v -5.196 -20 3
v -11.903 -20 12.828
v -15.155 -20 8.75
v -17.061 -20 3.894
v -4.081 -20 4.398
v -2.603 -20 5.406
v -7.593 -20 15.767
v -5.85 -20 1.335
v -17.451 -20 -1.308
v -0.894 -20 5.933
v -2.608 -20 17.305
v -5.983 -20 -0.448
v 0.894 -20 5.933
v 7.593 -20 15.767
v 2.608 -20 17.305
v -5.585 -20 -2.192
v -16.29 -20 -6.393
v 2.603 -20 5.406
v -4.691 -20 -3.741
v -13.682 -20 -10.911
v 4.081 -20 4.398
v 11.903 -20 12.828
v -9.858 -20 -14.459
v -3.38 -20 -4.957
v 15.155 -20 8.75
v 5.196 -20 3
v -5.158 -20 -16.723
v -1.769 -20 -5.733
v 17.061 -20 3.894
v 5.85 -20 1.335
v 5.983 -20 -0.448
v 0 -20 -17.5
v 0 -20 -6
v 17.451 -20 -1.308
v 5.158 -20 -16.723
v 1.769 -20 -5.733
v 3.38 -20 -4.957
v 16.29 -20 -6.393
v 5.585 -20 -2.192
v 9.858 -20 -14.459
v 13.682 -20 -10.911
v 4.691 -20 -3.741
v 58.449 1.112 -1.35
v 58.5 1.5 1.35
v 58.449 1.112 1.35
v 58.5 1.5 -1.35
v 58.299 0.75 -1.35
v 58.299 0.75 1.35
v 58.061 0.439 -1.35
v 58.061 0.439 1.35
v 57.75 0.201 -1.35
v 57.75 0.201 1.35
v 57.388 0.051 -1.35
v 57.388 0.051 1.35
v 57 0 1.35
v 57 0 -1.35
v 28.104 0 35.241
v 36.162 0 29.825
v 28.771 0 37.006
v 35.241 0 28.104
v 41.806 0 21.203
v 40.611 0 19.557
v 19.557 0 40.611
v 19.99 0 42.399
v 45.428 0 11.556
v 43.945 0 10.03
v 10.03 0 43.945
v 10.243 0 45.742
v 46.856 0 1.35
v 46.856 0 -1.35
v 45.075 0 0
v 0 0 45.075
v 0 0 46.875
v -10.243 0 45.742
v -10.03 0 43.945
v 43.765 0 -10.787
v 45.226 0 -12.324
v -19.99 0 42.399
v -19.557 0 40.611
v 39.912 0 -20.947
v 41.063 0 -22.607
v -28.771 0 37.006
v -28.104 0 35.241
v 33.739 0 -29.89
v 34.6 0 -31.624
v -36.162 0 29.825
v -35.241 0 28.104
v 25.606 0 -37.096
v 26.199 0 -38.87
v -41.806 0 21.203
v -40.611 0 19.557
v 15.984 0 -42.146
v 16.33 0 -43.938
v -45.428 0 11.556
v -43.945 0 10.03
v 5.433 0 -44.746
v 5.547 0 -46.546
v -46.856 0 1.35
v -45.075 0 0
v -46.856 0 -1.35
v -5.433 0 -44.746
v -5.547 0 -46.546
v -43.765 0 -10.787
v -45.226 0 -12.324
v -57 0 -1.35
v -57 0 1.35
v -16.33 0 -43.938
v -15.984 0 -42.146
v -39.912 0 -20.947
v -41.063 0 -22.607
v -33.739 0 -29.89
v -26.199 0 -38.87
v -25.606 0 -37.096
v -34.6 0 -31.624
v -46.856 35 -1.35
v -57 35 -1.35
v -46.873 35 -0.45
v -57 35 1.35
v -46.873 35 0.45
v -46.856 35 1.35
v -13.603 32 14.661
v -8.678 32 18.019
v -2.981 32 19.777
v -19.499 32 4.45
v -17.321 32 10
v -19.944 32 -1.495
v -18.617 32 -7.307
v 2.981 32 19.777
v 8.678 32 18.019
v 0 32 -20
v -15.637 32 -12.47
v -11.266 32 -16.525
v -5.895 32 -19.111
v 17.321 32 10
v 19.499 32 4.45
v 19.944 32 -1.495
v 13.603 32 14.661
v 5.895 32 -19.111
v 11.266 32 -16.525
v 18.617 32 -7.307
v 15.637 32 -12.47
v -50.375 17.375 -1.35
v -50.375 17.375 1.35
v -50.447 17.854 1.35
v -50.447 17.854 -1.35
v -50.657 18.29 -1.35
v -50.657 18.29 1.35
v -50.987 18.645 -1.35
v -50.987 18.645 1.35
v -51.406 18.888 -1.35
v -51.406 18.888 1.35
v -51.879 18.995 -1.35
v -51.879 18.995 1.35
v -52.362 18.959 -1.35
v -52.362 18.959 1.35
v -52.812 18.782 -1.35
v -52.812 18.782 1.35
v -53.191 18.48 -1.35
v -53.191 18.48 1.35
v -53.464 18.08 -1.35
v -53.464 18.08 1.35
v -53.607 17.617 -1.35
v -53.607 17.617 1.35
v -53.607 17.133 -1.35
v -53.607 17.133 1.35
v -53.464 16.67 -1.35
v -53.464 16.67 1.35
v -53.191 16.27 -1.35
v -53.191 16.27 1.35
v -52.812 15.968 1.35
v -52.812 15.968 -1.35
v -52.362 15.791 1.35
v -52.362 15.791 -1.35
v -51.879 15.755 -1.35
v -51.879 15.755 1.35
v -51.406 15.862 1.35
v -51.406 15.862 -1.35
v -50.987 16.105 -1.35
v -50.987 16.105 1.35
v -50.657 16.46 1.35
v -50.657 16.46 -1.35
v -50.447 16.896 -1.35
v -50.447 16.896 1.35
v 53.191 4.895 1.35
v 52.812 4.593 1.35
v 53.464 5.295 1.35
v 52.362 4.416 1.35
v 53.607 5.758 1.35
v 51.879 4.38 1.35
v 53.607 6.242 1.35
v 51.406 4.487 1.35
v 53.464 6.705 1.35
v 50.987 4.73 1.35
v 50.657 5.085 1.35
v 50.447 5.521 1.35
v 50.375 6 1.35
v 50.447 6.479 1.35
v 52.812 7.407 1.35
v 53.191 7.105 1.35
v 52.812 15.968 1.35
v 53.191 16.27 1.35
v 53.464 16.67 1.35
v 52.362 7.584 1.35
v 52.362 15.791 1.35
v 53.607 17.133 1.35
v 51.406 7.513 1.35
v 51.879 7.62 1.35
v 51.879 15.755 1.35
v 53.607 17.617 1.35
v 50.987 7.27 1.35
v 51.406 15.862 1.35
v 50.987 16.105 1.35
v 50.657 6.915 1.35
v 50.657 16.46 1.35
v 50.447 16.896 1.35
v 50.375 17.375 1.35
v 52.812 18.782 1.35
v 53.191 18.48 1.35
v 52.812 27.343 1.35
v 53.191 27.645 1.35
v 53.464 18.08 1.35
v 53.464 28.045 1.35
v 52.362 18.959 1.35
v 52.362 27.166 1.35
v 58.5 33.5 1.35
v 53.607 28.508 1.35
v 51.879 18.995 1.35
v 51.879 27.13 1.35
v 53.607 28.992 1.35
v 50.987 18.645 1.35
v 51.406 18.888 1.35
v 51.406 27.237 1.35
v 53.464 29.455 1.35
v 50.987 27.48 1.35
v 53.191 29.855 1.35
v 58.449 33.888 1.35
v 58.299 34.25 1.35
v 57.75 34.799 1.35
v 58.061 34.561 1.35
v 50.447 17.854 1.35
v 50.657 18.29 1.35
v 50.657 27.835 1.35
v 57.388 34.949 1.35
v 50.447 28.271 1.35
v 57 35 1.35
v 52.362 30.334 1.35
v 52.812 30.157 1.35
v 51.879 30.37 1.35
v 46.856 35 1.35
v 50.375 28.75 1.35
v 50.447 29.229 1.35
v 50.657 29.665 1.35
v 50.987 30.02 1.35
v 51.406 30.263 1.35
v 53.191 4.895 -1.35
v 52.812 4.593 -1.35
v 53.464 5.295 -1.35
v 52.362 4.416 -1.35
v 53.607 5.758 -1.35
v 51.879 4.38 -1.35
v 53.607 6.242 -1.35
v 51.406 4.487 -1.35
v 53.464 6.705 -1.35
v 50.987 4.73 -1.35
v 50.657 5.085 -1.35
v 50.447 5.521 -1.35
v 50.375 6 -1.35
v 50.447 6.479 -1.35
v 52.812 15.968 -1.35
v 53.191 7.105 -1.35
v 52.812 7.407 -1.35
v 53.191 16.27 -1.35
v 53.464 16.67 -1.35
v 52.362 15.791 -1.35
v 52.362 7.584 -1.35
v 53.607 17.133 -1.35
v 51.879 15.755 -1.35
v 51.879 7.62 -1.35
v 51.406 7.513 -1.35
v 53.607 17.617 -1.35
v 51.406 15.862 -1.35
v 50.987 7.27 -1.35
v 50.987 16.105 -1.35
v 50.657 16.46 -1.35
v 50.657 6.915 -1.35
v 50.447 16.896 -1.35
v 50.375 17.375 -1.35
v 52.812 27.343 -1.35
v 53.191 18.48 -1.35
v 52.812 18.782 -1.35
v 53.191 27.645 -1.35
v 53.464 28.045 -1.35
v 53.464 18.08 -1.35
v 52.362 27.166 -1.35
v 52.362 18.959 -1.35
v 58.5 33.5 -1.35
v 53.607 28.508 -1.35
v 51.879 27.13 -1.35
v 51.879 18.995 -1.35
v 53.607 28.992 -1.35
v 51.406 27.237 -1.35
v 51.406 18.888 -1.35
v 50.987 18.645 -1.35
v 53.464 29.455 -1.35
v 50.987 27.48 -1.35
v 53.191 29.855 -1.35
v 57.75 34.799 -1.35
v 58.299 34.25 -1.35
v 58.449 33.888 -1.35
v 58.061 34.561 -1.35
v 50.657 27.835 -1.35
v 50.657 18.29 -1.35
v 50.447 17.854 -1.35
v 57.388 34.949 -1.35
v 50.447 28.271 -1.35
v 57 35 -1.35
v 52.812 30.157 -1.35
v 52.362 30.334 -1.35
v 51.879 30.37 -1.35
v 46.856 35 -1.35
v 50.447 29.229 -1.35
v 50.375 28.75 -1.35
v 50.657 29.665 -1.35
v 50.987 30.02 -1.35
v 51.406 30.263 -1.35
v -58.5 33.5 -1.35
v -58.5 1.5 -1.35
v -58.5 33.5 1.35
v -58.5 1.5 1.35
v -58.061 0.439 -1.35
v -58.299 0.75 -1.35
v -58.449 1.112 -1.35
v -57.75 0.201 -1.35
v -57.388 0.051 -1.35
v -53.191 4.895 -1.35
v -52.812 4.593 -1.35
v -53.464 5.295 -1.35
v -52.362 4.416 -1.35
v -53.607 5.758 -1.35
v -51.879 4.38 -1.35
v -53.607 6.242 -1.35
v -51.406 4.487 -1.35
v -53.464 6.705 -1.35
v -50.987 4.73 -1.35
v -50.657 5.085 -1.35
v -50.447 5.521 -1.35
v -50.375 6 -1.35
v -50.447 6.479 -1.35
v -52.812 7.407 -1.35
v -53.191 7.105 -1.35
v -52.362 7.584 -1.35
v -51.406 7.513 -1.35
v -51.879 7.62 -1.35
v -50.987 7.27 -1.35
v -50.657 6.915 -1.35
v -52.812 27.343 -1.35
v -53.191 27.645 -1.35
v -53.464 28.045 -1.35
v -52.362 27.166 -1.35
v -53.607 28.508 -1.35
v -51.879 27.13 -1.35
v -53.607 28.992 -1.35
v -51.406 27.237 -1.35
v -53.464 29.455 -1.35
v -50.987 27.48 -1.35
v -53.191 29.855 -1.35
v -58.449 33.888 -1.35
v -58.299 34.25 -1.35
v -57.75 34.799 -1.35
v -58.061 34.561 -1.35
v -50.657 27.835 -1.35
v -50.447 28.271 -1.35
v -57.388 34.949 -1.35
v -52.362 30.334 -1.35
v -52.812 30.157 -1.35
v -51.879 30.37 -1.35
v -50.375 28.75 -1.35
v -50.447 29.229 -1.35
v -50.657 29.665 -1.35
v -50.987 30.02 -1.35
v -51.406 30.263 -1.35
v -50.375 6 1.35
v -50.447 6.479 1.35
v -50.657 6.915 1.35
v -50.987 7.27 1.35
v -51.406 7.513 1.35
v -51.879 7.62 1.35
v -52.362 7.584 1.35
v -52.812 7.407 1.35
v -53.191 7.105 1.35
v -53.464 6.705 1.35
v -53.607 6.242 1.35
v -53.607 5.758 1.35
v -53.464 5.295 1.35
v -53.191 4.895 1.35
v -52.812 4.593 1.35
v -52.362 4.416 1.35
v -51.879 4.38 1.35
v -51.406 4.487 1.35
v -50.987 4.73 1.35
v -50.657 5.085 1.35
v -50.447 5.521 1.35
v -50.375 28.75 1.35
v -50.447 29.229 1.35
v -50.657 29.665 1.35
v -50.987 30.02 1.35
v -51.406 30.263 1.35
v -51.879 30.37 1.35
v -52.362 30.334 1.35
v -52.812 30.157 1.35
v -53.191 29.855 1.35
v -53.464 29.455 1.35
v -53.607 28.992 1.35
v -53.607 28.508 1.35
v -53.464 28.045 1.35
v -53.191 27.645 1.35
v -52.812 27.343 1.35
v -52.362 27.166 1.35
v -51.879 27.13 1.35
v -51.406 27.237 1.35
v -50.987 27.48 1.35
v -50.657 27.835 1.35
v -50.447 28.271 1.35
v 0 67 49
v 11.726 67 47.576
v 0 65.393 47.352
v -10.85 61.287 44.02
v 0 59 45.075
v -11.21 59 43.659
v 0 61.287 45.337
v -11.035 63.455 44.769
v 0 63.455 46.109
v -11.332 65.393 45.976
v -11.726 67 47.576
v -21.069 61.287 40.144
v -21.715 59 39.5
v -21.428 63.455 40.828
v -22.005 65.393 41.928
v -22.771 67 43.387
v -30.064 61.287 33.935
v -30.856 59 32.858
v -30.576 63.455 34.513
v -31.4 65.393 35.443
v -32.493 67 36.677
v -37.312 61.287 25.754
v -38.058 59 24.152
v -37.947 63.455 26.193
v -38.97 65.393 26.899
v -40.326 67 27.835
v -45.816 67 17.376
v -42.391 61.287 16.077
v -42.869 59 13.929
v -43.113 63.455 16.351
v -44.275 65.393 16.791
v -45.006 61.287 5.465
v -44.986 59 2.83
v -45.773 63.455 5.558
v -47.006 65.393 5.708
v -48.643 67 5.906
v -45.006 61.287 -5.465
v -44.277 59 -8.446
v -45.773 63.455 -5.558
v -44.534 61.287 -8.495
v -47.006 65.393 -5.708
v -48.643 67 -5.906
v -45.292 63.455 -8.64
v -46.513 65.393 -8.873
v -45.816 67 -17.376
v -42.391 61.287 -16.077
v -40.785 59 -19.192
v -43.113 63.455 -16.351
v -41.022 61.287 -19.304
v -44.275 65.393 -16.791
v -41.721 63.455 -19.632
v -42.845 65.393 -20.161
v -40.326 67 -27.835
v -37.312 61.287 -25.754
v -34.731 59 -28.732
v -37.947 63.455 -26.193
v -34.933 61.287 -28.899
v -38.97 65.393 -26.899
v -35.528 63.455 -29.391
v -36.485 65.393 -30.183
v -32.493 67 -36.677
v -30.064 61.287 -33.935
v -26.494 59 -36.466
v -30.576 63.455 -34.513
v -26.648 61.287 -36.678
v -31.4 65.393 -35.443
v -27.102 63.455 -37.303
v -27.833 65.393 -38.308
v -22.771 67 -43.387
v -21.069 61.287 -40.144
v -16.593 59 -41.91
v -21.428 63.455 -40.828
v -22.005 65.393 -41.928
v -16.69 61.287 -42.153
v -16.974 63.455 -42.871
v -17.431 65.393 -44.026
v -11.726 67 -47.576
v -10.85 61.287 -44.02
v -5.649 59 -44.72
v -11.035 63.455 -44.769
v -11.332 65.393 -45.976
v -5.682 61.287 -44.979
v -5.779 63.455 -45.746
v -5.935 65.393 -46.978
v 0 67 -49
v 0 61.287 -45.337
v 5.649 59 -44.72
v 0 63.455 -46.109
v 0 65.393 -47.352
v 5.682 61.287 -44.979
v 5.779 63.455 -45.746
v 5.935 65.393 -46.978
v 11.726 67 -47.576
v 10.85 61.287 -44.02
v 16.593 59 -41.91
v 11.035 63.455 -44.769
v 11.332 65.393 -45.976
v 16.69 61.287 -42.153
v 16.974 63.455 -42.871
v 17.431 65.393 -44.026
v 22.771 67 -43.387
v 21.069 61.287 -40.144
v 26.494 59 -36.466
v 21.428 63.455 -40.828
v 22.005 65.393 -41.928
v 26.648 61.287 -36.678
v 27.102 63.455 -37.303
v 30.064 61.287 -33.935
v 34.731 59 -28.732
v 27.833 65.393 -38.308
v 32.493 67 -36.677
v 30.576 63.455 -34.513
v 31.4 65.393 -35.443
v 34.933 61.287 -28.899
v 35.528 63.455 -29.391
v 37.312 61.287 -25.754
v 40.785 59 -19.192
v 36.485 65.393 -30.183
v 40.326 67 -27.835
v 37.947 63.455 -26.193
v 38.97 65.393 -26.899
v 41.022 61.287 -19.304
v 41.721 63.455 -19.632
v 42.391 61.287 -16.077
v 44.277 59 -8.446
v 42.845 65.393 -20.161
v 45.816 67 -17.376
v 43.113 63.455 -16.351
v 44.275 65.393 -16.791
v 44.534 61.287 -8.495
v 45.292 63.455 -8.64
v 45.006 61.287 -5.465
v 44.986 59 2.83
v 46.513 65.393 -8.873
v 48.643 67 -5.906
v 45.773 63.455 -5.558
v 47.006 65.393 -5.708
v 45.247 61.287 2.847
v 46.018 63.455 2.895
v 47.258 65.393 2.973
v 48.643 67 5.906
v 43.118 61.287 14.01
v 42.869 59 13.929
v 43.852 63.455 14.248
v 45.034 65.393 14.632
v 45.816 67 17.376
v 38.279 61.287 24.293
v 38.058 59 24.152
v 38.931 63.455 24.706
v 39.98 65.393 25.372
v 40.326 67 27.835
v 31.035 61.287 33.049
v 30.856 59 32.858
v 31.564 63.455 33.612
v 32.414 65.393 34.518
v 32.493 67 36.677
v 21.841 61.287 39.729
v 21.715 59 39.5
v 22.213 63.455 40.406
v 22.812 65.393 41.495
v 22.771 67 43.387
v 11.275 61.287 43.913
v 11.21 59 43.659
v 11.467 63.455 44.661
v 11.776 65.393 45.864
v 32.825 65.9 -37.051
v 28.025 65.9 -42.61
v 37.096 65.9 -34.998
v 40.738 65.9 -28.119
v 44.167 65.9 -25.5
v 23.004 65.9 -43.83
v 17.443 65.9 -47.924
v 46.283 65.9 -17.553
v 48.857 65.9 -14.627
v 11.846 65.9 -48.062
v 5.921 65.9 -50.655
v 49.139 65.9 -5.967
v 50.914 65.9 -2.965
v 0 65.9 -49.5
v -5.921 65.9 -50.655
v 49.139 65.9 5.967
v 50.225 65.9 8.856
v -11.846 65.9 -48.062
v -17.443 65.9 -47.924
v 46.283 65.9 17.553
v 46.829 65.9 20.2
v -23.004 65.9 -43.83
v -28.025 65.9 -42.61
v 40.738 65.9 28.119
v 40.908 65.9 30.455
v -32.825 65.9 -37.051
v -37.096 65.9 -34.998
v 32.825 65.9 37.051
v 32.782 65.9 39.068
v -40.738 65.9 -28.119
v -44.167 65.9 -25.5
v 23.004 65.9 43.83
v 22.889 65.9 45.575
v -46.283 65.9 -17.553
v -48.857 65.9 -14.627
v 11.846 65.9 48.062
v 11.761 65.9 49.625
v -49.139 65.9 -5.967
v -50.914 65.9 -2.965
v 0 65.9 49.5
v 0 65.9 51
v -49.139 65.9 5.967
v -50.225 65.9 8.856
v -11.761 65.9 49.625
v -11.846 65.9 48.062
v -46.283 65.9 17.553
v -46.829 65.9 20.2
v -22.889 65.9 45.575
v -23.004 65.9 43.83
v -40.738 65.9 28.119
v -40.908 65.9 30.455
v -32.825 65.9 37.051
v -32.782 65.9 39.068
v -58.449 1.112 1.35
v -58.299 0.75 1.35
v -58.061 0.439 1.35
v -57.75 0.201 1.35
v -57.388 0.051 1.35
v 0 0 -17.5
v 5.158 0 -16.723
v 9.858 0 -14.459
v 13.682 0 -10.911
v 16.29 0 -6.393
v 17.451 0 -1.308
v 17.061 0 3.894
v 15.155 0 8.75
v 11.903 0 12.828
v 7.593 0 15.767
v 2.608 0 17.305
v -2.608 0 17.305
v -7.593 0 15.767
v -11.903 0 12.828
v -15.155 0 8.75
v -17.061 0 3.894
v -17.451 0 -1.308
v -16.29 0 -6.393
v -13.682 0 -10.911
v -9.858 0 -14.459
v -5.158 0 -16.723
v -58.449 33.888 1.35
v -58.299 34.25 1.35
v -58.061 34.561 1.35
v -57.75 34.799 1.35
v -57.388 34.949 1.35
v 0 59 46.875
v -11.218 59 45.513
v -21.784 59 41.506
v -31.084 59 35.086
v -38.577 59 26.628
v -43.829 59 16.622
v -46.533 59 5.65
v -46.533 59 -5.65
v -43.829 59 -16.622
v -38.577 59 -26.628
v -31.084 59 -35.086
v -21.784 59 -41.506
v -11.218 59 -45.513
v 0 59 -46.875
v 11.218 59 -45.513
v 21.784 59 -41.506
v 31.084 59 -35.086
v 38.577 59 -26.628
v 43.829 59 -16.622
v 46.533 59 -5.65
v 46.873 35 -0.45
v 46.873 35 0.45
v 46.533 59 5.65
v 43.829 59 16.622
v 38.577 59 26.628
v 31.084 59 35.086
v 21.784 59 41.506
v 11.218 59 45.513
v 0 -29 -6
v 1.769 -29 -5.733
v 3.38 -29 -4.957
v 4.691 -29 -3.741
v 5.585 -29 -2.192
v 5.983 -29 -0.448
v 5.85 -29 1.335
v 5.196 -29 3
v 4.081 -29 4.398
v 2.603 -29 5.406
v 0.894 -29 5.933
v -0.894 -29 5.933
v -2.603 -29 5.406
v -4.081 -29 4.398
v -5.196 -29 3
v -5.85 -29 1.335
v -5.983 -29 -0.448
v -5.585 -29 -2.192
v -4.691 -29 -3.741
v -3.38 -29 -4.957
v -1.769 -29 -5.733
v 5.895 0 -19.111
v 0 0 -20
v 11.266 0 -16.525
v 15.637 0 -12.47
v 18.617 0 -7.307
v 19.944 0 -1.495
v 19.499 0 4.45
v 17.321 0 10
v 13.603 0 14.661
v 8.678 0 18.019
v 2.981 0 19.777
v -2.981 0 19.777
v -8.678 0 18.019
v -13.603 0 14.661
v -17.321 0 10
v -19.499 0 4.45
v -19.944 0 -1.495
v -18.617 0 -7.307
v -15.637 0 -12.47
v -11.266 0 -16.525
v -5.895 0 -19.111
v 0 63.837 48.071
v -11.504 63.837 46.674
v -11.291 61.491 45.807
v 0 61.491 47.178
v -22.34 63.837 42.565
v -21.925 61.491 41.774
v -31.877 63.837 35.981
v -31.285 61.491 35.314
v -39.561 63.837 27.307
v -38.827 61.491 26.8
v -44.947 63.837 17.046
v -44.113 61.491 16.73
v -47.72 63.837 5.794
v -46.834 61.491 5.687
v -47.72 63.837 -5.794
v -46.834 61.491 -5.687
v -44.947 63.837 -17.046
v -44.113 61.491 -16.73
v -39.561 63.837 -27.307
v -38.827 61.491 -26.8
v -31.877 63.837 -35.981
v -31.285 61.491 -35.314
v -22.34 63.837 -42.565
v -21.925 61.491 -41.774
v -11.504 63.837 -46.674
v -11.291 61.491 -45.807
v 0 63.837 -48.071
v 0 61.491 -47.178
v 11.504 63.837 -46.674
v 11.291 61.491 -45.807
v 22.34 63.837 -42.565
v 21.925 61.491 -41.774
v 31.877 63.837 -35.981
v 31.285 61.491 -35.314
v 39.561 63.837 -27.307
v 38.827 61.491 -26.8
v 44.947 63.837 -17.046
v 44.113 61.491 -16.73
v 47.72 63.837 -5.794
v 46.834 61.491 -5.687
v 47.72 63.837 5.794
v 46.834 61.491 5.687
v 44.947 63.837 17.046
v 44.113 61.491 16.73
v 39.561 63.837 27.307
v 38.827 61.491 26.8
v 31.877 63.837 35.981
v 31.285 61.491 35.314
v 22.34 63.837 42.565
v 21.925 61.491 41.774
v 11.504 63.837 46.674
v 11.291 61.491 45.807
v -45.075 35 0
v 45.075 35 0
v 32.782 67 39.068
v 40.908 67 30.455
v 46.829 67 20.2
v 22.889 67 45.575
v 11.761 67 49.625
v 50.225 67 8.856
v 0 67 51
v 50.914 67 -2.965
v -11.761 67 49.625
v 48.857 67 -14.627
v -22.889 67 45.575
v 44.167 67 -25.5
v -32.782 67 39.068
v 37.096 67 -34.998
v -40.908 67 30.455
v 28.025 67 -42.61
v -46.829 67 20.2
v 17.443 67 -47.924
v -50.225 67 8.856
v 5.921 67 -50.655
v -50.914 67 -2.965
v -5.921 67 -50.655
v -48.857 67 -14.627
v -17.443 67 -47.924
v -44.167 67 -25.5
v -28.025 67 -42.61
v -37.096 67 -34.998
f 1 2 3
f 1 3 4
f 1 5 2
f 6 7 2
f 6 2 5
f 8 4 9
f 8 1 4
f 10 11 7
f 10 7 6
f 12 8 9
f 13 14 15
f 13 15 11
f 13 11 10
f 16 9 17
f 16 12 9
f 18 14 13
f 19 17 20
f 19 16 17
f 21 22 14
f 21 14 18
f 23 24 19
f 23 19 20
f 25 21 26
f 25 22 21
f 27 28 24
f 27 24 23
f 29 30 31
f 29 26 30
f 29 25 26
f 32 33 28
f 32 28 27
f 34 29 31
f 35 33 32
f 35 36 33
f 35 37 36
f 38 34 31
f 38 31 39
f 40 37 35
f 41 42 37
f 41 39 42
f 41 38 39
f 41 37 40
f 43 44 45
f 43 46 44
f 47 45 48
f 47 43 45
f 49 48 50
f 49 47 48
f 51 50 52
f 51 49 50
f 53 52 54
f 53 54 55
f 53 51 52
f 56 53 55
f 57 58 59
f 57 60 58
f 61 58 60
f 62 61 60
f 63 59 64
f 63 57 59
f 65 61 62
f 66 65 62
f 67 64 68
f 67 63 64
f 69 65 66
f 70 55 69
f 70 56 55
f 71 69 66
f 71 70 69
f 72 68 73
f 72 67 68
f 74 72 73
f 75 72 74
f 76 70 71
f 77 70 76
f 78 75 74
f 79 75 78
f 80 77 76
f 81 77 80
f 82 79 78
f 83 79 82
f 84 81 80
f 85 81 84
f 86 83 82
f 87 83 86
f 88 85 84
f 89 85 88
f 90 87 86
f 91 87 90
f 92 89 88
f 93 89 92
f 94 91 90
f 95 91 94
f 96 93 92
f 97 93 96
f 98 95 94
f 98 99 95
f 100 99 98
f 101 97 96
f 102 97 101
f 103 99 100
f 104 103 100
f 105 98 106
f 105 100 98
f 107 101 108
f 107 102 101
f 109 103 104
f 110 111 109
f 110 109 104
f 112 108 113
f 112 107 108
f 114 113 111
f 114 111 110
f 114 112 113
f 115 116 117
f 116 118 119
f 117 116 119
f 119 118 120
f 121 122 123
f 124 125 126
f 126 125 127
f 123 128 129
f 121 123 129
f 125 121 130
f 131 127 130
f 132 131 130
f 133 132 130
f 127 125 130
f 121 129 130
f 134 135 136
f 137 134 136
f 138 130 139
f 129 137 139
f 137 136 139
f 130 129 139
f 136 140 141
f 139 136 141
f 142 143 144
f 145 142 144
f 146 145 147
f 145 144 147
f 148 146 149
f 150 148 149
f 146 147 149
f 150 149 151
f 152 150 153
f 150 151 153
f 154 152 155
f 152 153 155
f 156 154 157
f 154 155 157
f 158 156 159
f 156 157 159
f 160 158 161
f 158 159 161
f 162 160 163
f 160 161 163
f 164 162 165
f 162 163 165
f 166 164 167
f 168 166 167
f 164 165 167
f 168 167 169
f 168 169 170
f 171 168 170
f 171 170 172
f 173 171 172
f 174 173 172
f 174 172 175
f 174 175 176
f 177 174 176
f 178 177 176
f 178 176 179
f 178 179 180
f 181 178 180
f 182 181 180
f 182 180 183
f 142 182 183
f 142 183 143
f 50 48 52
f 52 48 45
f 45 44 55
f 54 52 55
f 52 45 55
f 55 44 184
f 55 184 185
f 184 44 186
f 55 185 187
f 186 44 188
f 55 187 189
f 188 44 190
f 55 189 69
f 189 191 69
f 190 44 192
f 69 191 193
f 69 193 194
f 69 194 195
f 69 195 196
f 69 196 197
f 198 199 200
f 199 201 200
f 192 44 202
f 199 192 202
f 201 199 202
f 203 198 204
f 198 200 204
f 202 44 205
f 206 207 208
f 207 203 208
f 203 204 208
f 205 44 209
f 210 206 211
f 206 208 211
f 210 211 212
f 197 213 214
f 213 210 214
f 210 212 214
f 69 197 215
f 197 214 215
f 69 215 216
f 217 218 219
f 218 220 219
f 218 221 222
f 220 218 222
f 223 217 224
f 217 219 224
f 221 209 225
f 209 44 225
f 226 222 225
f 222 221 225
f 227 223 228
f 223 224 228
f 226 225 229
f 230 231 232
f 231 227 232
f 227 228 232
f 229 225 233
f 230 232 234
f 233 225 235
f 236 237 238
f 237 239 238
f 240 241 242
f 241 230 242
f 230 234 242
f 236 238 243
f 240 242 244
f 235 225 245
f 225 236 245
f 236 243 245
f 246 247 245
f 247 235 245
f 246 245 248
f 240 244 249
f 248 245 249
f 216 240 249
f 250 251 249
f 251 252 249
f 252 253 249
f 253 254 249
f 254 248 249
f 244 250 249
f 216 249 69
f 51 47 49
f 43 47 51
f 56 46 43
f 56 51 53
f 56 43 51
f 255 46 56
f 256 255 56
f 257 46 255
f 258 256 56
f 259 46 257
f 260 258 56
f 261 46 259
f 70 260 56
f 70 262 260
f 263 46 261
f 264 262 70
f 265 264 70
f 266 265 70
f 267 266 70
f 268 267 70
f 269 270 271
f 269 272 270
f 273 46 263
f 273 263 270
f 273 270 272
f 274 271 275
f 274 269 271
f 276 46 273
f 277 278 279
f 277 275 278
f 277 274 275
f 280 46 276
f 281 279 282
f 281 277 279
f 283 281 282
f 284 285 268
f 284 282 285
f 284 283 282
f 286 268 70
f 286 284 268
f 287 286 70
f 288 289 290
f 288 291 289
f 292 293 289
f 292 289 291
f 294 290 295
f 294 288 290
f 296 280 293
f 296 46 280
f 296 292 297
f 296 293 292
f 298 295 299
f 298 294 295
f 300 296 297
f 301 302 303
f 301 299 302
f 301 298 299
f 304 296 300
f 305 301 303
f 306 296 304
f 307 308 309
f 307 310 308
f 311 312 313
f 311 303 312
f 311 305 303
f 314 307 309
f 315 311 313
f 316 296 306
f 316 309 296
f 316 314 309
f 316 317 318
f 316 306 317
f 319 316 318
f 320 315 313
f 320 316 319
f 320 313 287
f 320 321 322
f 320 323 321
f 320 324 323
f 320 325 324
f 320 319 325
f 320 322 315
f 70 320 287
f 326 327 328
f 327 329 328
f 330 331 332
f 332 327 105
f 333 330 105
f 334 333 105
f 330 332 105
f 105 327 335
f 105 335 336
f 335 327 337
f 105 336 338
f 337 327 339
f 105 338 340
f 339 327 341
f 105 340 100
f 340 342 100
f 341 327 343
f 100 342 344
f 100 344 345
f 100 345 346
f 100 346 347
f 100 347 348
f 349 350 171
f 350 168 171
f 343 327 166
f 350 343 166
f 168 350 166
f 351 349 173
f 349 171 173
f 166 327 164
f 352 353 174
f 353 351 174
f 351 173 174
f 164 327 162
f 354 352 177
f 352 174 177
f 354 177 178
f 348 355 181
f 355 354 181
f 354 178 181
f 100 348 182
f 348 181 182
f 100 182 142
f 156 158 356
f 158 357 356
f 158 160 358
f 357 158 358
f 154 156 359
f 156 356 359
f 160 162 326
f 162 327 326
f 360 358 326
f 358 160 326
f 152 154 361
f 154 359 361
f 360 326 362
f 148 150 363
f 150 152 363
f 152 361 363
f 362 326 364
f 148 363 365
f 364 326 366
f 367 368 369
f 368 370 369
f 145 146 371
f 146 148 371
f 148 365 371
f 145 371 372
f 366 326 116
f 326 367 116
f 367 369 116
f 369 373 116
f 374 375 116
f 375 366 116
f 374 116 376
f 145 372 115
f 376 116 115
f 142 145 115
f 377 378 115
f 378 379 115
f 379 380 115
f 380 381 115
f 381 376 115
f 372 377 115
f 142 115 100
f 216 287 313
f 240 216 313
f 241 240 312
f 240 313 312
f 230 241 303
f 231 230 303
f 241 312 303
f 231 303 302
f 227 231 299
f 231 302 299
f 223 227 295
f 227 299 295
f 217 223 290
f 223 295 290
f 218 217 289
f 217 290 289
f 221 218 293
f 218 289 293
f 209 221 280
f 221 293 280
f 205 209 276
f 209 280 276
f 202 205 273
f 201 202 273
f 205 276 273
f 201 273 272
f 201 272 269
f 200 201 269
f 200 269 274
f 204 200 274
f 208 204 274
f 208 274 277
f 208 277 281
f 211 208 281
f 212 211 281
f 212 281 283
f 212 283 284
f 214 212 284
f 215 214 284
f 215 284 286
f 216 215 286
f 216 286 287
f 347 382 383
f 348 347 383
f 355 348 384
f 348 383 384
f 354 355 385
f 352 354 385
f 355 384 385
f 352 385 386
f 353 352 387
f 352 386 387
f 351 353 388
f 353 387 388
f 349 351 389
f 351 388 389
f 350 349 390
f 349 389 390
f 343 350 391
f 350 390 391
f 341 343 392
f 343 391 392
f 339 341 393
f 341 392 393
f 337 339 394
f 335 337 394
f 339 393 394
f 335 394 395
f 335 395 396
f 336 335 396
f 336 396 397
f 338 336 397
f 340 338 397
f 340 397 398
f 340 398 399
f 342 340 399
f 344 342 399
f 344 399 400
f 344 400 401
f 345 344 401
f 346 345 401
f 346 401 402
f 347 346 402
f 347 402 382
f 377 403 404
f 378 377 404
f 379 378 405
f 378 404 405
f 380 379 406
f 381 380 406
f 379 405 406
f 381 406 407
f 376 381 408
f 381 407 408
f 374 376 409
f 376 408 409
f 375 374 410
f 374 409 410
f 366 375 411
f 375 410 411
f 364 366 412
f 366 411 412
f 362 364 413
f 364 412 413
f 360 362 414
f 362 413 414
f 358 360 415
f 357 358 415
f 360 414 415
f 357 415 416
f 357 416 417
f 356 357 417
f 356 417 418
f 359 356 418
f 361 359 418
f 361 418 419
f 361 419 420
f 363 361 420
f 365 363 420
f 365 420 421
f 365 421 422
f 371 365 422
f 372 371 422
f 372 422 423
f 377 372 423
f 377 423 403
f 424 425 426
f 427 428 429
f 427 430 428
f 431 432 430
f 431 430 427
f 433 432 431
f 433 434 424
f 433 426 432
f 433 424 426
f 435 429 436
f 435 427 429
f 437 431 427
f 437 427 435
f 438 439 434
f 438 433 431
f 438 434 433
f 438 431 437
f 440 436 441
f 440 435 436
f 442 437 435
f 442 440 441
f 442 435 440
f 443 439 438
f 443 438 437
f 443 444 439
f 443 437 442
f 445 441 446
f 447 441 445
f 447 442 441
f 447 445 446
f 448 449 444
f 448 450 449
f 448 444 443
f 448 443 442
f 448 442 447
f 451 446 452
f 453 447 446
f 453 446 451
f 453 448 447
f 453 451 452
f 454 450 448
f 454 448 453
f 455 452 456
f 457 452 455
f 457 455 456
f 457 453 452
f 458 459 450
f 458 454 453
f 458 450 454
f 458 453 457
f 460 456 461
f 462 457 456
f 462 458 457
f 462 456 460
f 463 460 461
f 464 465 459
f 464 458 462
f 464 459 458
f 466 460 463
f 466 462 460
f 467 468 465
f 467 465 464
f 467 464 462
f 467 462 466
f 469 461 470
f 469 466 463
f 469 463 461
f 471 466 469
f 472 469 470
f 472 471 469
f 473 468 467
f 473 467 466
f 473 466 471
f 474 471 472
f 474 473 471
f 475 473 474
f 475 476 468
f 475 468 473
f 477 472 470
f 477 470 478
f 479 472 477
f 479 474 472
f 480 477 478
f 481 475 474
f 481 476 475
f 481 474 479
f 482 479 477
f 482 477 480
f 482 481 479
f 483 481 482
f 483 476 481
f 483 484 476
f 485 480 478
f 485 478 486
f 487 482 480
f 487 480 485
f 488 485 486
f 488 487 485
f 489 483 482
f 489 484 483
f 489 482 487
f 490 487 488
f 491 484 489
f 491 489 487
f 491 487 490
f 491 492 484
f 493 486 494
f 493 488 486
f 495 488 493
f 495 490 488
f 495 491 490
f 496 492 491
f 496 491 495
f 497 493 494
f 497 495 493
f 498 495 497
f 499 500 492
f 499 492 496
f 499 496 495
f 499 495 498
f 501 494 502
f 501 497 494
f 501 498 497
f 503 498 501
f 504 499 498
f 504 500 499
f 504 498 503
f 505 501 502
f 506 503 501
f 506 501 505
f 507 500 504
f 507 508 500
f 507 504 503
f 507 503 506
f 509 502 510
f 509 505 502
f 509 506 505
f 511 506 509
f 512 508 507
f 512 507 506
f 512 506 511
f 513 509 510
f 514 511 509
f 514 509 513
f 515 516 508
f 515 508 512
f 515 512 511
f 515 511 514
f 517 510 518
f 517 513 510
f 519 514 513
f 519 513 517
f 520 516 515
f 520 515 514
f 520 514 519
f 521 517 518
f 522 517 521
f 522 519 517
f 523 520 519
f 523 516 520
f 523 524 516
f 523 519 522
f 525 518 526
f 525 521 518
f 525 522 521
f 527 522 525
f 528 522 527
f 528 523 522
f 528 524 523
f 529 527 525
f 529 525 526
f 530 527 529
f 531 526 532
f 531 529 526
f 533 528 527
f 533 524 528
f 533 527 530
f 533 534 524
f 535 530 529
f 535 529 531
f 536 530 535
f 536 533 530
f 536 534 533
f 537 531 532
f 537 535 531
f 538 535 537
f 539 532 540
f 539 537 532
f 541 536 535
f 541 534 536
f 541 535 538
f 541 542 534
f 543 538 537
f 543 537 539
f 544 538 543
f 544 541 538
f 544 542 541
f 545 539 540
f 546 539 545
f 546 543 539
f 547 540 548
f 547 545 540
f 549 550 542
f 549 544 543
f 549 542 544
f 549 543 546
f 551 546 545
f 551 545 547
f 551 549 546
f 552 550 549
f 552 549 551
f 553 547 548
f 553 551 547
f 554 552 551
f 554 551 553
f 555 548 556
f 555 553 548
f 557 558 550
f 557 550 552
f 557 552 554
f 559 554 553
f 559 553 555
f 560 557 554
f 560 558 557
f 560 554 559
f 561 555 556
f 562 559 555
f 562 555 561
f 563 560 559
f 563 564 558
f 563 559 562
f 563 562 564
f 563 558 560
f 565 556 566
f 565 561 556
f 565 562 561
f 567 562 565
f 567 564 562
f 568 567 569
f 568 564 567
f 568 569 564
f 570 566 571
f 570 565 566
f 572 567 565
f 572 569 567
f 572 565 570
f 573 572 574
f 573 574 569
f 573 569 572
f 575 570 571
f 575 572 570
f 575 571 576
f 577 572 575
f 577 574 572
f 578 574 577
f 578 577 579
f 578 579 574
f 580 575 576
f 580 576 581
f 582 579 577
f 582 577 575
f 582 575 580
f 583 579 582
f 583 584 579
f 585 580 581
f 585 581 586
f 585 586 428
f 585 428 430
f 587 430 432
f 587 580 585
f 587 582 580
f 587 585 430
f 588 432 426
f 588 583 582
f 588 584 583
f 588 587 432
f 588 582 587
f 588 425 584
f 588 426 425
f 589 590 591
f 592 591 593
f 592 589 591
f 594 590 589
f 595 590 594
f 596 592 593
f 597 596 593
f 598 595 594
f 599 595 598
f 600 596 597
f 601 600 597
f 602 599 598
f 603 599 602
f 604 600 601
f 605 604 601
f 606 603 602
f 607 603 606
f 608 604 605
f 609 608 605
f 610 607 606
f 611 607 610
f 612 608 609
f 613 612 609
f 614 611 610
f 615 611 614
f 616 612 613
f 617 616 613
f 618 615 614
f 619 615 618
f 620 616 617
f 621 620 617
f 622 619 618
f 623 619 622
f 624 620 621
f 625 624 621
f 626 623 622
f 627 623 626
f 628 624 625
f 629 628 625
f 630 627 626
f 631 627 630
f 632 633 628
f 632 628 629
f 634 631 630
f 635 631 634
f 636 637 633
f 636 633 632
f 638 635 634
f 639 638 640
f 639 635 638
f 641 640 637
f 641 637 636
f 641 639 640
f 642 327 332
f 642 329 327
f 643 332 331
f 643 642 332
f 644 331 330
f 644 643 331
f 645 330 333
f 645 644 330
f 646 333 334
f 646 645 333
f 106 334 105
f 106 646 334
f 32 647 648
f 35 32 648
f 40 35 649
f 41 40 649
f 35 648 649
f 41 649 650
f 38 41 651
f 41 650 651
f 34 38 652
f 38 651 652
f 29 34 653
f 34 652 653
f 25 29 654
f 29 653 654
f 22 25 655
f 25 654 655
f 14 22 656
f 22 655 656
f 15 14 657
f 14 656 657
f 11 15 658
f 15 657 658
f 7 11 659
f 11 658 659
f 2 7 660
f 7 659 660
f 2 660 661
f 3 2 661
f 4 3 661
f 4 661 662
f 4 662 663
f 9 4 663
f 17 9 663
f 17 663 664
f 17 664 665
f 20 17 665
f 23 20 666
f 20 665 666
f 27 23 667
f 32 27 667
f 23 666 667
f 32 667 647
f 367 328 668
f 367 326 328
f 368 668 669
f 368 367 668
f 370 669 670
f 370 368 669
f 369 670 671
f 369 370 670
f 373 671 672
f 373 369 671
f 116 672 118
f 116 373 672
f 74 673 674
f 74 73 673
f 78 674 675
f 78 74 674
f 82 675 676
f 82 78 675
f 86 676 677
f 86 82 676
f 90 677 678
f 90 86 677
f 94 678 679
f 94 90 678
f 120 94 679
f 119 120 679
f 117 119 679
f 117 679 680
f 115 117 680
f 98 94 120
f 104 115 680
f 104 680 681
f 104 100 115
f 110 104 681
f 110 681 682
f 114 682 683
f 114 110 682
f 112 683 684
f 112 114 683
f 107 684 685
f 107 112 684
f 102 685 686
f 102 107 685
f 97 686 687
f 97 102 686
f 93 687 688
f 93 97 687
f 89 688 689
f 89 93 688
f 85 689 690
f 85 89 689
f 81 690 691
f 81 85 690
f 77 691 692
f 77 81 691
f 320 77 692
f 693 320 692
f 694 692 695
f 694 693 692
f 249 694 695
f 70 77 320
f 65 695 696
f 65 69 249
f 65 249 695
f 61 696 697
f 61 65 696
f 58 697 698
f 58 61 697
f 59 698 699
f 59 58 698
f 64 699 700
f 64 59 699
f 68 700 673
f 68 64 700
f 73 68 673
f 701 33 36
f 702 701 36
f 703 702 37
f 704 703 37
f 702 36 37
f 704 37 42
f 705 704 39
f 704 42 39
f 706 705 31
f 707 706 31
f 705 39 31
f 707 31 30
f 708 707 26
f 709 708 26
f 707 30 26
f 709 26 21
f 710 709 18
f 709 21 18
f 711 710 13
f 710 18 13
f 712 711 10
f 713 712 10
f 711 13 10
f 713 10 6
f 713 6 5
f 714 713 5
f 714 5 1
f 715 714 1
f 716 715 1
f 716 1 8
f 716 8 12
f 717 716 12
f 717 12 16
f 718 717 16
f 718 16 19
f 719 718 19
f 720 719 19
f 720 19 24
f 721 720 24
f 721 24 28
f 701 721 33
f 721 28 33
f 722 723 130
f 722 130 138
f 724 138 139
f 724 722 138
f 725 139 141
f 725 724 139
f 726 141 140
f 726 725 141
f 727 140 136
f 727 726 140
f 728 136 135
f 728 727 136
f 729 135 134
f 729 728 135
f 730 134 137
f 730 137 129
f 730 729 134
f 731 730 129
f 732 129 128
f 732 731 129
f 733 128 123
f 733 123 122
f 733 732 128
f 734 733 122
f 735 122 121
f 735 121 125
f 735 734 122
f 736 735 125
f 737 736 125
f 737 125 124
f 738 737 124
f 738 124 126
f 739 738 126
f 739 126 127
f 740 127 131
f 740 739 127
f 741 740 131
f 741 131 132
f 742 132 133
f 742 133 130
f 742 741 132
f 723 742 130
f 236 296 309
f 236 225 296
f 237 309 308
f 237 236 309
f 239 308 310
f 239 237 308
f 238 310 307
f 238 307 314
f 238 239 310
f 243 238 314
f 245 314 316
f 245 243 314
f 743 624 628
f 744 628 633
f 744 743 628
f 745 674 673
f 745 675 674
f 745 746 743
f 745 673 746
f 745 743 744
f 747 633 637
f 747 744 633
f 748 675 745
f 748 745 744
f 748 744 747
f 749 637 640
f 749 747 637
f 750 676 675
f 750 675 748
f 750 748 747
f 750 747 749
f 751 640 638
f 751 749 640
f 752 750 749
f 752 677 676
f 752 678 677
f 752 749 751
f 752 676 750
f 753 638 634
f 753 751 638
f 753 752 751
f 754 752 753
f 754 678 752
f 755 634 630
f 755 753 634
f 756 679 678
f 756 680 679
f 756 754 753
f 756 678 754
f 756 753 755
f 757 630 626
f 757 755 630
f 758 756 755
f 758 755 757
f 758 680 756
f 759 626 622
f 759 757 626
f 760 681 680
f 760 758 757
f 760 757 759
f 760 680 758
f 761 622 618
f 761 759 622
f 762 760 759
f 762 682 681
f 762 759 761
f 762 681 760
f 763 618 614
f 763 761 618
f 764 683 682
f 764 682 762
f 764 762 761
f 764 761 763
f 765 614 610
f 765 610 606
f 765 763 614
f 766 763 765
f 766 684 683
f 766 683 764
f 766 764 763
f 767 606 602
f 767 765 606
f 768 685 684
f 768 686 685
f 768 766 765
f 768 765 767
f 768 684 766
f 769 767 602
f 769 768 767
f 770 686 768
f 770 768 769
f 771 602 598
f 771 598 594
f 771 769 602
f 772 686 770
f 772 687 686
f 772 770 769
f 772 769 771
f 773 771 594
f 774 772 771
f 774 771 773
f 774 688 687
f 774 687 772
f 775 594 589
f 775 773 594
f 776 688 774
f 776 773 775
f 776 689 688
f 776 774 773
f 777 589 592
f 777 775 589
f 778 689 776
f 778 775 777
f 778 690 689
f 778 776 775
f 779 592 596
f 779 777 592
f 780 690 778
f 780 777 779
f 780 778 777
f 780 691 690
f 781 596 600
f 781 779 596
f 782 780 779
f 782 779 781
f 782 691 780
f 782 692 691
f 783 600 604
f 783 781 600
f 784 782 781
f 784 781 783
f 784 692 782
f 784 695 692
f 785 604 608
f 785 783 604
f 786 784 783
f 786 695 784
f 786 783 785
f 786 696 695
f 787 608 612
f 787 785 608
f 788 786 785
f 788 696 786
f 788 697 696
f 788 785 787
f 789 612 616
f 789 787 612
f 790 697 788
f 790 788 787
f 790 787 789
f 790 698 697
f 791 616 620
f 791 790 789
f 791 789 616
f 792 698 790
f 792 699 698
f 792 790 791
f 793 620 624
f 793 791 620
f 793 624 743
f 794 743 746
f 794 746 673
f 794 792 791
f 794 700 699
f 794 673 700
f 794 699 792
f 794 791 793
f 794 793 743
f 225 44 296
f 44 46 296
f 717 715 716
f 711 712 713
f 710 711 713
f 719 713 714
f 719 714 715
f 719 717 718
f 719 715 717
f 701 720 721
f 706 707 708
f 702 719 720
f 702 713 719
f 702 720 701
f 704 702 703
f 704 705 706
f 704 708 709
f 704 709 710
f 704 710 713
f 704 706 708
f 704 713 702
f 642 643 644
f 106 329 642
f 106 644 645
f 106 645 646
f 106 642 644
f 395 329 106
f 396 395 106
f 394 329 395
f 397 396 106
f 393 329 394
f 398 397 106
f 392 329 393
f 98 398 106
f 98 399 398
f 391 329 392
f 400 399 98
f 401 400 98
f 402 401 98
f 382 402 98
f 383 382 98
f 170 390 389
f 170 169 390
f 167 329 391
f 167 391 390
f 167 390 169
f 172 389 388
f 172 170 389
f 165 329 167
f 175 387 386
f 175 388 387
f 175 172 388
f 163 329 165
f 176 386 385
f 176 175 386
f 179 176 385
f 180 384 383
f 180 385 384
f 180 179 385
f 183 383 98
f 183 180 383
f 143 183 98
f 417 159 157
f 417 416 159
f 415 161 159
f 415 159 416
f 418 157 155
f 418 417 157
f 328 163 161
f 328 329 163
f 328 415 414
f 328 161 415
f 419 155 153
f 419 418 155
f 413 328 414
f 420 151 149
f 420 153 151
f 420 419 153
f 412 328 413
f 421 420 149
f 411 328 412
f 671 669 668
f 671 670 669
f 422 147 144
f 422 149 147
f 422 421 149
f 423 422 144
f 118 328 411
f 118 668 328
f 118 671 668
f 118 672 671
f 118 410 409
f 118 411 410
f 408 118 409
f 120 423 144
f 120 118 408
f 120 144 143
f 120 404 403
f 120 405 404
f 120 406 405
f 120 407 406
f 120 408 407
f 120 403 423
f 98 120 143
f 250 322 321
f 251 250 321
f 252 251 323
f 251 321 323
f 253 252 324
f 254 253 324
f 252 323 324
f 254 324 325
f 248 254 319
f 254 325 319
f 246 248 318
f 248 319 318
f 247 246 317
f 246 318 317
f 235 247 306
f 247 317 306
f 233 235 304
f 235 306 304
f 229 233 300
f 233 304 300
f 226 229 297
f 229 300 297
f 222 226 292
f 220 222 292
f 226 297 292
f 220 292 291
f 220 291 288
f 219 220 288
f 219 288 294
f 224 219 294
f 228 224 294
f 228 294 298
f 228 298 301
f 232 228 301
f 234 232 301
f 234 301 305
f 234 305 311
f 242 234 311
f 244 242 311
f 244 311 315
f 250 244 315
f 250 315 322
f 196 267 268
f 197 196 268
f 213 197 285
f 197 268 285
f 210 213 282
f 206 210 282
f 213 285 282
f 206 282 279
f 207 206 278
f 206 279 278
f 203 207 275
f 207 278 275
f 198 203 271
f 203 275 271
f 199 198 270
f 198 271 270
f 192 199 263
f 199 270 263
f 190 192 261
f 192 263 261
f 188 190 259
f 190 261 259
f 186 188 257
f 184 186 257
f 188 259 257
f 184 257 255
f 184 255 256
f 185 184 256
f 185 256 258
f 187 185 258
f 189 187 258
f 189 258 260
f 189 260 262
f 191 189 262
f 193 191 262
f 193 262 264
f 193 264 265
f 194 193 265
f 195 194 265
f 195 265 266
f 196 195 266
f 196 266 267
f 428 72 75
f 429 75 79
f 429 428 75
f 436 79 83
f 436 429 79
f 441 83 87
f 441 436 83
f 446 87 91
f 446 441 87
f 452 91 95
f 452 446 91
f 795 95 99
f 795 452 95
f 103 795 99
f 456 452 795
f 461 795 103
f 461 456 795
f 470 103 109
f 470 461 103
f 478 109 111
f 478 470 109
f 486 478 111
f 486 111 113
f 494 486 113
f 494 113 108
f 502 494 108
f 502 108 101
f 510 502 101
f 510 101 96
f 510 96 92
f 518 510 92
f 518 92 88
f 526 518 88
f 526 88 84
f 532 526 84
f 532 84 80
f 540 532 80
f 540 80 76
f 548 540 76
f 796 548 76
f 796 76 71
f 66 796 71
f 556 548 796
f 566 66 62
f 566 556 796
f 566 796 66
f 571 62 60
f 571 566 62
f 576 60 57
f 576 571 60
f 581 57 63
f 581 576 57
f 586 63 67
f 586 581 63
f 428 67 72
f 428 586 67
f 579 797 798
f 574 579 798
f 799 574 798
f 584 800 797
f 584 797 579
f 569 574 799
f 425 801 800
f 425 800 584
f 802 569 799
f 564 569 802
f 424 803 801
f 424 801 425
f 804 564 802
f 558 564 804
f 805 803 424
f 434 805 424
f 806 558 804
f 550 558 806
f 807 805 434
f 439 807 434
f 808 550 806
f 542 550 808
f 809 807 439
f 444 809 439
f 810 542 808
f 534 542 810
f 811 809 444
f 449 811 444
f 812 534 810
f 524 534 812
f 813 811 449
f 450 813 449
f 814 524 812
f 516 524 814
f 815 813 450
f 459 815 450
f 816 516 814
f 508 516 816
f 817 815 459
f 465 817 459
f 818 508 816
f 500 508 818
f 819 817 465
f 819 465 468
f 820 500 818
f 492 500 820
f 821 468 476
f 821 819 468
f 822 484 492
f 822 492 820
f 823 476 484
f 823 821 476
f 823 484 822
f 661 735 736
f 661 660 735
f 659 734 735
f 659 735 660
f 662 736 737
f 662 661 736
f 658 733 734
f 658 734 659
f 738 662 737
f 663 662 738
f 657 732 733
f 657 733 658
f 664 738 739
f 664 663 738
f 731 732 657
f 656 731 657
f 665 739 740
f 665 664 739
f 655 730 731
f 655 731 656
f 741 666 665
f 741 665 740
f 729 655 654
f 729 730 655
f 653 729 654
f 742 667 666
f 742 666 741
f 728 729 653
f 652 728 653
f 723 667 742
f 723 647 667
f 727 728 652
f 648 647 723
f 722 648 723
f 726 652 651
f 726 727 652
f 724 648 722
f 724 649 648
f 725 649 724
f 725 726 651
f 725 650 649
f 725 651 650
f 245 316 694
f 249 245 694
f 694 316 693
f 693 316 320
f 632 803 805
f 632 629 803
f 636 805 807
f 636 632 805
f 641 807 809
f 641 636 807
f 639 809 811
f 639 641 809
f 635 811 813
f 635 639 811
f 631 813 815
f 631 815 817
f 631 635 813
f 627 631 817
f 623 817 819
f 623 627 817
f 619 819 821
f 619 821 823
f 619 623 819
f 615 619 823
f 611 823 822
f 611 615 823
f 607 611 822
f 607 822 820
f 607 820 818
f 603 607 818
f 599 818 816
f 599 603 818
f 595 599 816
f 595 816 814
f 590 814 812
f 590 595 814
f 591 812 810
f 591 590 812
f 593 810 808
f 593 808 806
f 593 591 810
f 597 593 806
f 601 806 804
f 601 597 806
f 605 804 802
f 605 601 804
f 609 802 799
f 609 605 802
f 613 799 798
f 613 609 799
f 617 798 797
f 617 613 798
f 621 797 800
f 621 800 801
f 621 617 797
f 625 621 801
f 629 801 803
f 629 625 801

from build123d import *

# Parameters (mm, degrees)
SKETCH2_R                = 20
BOSS_EXTRUDE1_DEPTH      = 32
SKETCH3_R                = 17.5
BOSS_EXTRUDE2_DEPTH      = 20
SKETCH4_R                = 6
BOSS_EXTRUDE3_DEPTH      = 9
SKETCH5_W                = 13.425
SKETCH5_H                = 35
BOSS_EXTRUDE4_DEPTH      = 1.35
SKETCH6_R                = 1.625
CUT_EXTRUDE1_DEPTH       = 104.207424636
FILLET1_R                = 1.5
CIRPATTERN1_COUNT        = 2
FILLET1_OF_CIRPATTERN1_R = 1.5


with BuildPart() as part:
    # Sketch1 → Revolve1 (revolve)
    with BuildSketch(Plane.XY):
        with BuildLine():
            Line((-45.075, 0), (-45.075, 59))
            ThreePointArc((-45.075, 59), (-46.109109283, 63.455491696), (-49, 67))
            Line((-49, 67), (-51, 67))
            Line((-51, 67), (-51, 65.9))
            Line((-51, 65.9), (-49.5, 65.9))
            ThreePointArc((-49.5, 65.9), (-47.553417784, 62.69122693), (-46.875, 59))
            Line((-46.875, 59), (-46.875, 0))
            Line((-46.875, 0), (-45.075, 0))
        make_face()
    revolve(axis=Axis((0, 55, 0), (0, -1, 0)))

    # Sketch5 → Boss-Extrude4 (add, symmetric)
    with BuildSketch(Plane.XY):
        with Locations((-51.7875, 17.5)):
            Rectangle(SKETCH5_W, SKETCH5_H)
    boss_extrude4 = extrude(amount=BOSS_EXTRUDE4_DEPTH, both=True)

    # Sketch6 → Cut-Extrude1 (cut, through all)
    with BuildSketch(Plane.XY.offset(1.35)):
        with Locations((-52, 6)):
            Circle(SKETCH6_R)
        with Locations((-52, 17.375)):
            Circle(SKETCH6_R)
        with Locations((-52, 28.75)):
            Circle(SKETCH6_R)
    cut_extrude1 = extrude(amount=-CUT_EXTRUDE1_DEPTH, mode=Mode.SUBTRACT)

    # Fillet1
    fillet1_edges = [part.edges().sort_by_distance(p)[0] for p in [
        (-58.5, 35, 0),
        (-58.5, 0, 0),
    ]]
    fillet(fillet1_edges, radius=FILLET1_R)

    # CirPattern1: Boss-Extrude4, Cut-Extrude1 ×2 about axis
    cirpattern1_axis = Axis((0, 55, 0), (0, -1, 0))
    add([boss_extrude4.rotate(cirpattern1_axis, i * 360 / CIRPATTERN1_COUNT) for i in range(1, CIRPATTERN1_COUNT)])
    add([cut_extrude1.rotate(cirpattern1_axis, i * 360 / CIRPATTERN1_COUNT) for i in range(1, CIRPATTERN1_COUNT)], mode=Mode.SUBTRACT)

    # Fillet1 of CirPattern1
    fillet1_of_cirpattern1_edges = [part.edges().sort_by_distance(p)[0] for p in [
        (58.5, 35, 0),
        (58.5, 0, 0),
    ]]
    fillet(fillet1_of_cirpattern1_edges, radius=FILLET1_OF_CIRPATTERN1_R)


with BuildPart() as body_2:
    # Sketch2 → Boss-Extrude1 (new body)
    with BuildSketch(Plane.XZ):
        Circle(SKETCH2_R)
    extrude(amount=-BOSS_EXTRUDE1_DEPTH)

    # Sketch3 → Boss-Extrude2 (add)
    with BuildSketch(Plane.XZ):
        Circle(SKETCH3_R)
    extrude(amount=BOSS_EXTRUDE2_DEPTH)

    # Sketch4 → Boss-Extrude3 (add)
    with BuildSketch(Plane.XZ.offset(20)):
        Circle(SKETCH4_R)
    extrude(amount=BOSS_EXTRUDE3_DEPTH)


solid = Compound([part.part, body_2.part])
